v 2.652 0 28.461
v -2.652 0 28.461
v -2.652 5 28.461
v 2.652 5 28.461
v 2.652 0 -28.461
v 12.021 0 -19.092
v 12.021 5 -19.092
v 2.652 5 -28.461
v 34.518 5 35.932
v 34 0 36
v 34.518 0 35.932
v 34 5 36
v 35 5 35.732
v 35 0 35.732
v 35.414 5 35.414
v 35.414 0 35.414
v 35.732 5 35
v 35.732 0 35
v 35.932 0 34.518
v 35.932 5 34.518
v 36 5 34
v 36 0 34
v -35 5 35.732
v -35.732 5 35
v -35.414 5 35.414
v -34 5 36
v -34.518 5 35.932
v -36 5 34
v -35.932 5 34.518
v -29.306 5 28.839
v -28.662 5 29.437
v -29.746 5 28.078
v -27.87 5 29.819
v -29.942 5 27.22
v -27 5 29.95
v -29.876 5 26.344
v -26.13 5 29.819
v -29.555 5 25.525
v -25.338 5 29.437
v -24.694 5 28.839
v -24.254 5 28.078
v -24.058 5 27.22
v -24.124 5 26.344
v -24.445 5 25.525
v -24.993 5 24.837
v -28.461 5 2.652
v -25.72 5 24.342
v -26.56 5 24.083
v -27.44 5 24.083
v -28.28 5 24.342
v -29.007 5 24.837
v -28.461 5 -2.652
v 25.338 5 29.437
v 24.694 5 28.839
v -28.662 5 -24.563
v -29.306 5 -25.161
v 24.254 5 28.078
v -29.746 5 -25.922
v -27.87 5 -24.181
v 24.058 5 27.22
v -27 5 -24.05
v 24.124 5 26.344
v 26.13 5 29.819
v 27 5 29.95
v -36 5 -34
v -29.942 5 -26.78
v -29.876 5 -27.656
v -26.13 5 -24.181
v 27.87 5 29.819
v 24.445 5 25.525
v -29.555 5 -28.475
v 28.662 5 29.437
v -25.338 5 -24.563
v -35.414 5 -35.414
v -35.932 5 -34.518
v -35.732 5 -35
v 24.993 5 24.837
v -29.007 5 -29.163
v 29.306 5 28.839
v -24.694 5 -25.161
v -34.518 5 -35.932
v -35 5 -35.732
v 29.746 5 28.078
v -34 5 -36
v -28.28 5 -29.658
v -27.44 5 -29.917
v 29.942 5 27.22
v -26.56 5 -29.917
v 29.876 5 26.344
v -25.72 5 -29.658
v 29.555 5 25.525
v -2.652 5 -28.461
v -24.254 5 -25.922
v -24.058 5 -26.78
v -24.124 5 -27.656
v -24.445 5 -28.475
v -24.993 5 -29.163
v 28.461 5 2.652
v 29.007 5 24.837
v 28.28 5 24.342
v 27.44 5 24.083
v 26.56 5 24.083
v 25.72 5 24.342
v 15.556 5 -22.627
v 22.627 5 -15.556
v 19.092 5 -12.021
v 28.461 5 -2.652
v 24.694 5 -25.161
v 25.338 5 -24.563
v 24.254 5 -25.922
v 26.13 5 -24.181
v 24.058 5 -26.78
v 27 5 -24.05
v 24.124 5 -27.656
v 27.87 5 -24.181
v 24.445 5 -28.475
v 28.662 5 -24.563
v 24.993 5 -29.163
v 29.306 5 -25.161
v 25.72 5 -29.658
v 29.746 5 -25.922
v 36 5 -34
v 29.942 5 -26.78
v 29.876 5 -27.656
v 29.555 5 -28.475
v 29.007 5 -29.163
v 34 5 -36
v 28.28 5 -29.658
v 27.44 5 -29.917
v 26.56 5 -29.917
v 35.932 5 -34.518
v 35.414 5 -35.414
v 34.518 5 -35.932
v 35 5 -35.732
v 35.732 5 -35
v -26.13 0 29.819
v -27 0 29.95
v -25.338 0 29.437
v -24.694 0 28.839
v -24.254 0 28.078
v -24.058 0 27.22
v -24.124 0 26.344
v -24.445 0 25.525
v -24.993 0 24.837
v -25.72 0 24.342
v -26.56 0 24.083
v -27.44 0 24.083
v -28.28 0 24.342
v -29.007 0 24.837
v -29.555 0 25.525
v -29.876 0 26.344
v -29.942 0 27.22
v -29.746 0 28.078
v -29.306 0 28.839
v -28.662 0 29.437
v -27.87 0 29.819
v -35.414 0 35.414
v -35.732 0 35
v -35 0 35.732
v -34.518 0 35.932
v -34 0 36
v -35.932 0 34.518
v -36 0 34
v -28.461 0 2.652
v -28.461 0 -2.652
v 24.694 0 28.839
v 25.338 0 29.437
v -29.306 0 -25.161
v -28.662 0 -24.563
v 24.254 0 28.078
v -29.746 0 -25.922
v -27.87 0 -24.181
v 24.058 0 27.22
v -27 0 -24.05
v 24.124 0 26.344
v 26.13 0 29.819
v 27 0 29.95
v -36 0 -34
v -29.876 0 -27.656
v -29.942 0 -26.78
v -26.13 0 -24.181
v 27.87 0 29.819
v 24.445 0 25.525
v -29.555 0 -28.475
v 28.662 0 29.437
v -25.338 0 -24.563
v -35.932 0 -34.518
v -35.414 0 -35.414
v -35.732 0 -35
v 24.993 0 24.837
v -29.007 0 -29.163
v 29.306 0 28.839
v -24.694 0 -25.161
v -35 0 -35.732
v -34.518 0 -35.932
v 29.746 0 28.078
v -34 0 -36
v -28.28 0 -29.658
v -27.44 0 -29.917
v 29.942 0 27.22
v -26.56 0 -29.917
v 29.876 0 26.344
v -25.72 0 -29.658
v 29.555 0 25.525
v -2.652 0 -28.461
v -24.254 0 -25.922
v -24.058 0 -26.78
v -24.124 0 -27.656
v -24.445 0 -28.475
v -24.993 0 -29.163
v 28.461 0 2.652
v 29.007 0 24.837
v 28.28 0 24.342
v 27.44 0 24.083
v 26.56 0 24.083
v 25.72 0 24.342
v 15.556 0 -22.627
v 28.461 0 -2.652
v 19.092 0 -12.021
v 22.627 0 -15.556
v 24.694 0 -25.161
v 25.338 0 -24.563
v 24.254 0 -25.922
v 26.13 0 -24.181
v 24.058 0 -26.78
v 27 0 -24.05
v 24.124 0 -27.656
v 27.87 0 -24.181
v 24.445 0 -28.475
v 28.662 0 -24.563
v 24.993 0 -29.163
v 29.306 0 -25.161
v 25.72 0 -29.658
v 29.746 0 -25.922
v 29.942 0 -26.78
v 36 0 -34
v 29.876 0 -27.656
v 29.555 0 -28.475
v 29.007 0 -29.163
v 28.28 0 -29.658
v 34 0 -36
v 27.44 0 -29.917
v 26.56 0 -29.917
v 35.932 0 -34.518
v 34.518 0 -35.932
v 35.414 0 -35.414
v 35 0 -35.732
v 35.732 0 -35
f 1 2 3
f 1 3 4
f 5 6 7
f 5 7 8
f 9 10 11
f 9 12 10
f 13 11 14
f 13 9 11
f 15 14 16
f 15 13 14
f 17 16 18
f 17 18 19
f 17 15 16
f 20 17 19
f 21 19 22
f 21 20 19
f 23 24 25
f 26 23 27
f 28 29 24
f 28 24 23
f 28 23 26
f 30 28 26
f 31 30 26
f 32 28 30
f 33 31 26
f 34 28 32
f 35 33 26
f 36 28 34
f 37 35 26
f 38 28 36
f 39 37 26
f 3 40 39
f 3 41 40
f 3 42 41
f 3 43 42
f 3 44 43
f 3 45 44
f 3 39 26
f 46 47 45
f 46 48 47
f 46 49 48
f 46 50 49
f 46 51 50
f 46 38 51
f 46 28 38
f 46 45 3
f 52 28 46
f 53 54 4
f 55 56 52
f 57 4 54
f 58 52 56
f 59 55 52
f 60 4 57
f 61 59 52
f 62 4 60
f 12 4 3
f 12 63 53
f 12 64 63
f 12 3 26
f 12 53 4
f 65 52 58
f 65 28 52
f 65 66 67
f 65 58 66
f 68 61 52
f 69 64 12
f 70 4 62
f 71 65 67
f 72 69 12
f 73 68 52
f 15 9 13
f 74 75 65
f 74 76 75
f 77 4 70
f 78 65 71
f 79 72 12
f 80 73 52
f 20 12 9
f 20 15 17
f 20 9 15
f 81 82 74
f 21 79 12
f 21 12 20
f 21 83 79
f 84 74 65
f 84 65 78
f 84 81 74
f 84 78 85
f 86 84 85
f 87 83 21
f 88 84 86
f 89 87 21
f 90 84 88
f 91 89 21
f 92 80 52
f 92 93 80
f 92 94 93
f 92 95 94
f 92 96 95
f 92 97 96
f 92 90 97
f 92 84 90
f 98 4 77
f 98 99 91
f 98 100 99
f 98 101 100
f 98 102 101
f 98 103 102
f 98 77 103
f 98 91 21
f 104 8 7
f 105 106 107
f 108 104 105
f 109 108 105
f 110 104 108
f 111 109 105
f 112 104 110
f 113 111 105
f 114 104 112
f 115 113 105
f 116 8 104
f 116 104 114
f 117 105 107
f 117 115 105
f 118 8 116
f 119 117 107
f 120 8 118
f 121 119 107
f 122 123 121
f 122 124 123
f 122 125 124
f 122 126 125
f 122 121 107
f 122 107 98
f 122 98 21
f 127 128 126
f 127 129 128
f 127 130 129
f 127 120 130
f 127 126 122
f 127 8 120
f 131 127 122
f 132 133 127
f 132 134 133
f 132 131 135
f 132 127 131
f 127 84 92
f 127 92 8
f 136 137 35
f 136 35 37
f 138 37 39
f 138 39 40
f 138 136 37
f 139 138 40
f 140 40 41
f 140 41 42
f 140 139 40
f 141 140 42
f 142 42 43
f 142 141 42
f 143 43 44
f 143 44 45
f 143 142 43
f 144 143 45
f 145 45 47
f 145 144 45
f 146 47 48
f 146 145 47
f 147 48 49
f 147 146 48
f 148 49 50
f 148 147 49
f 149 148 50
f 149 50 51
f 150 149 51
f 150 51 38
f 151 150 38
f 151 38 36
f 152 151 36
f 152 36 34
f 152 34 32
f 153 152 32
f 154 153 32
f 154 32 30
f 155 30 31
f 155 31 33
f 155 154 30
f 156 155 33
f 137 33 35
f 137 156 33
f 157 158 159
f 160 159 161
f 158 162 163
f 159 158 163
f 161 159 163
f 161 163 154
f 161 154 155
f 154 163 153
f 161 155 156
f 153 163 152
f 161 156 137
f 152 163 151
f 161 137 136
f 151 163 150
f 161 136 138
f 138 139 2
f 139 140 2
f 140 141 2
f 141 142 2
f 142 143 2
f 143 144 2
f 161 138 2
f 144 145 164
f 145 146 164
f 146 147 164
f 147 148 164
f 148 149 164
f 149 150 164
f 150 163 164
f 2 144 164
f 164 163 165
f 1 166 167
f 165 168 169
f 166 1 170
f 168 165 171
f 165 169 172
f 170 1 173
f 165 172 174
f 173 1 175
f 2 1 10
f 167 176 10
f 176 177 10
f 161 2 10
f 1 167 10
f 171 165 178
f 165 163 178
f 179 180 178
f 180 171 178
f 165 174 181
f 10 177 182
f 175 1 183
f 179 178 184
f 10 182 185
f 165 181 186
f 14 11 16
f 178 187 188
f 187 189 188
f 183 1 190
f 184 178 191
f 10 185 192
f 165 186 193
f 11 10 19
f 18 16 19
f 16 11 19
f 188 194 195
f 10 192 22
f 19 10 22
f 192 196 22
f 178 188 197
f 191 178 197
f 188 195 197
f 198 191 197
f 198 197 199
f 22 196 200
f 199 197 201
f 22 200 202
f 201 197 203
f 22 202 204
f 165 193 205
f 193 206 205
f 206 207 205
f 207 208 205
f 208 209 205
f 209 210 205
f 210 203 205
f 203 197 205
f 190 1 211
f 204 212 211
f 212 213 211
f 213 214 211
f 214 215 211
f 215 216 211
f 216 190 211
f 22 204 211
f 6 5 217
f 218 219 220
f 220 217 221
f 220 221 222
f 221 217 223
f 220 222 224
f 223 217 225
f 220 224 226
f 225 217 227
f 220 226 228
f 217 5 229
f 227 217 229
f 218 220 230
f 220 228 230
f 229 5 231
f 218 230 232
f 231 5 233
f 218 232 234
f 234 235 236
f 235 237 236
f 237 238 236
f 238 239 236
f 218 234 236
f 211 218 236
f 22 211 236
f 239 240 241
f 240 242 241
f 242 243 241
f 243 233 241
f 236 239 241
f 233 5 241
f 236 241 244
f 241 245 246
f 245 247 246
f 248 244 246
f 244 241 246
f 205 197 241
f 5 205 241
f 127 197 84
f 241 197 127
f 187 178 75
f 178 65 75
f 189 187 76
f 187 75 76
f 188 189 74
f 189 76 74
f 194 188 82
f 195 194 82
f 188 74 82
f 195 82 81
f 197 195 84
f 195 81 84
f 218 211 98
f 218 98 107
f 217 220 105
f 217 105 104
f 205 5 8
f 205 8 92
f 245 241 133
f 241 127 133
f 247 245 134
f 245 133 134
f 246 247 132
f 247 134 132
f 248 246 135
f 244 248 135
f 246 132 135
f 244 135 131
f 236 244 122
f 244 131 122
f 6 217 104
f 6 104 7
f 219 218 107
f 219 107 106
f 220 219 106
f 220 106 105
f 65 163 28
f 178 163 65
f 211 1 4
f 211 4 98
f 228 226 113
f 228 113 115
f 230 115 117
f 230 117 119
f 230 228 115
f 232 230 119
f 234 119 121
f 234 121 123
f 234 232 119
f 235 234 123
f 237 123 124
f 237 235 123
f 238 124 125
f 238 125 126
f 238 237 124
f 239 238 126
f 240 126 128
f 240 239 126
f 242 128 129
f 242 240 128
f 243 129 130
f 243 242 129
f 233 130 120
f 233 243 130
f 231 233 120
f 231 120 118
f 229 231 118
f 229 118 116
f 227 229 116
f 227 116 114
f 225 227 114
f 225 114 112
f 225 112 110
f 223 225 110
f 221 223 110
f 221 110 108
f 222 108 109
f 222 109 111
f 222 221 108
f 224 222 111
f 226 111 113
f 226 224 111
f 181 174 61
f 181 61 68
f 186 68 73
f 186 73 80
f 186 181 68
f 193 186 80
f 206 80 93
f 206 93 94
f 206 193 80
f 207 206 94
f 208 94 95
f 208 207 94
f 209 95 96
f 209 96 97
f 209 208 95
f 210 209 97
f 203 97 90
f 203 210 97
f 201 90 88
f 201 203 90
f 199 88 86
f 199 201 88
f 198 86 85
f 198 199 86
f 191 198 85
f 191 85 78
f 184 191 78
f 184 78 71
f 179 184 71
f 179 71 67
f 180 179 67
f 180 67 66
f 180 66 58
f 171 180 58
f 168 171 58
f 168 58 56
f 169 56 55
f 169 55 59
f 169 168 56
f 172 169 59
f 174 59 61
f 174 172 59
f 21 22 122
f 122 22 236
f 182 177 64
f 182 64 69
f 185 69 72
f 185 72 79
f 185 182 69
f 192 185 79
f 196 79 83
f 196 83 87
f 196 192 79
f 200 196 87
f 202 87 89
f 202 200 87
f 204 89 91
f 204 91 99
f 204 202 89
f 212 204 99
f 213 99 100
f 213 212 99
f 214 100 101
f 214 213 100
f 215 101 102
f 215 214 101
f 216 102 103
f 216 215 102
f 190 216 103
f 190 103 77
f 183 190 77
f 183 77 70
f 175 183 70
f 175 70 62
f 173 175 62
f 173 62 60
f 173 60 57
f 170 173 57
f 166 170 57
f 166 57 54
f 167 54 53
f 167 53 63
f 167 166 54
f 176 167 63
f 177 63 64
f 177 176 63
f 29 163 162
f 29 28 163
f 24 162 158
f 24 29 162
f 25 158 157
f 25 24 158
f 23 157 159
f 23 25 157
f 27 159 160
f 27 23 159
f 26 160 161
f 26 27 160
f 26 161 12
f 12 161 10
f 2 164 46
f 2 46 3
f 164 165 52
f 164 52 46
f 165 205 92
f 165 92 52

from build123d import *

# Parameters (mm, degrees)
SKETCH1_W           = 72
SKETCH1_H           = 72
SKETCH1_R           = 2.95
BOSS_EXTRUDE1_DEPTH = 5
FILLET1_R           = 2


with BuildPart() as part:
    # Sketch1 → Boss-Extrude1 (new body)
    with BuildSketch(Plane(origin=(0, 0, 0), x_dir=(1, 0, 0), z_dir=(0, 1, 0))):
        Rectangle(SKETCH1_W, SKETCH1_H)
        with Locations(Location((-27, 27, 0), (0, 0, 270))):
            Circle(SKETCH1_R, mode=Mode.SUBTRACT)
        with Locations(Location((27, -27, 0), (0, 0, 270))):
            Circle(SKETCH1_R, mode=Mode.SUBTRACT)
        with Locations(Location((-27, -27, 0), (0, 0, 270))):
            Circle(SKETCH1_R, mode=Mode.SUBTRACT)
        with Locations(Location((27, 27, 0), (0, 0, 270))):
            Circle(SKETCH1_R, mode=Mode.SUBTRACT)
        Polygon((-28.461047943, -2.651650429), (-2.651650429, -28.461047943), (2.651650429, -28.461047943), (28.461047943, -2.651650429), (28.461047943, 2.651650429), (19.091883092, 12.02081528), (22.627416998, 15.556349186), (15.556349186, 22.627416998), (12.02081528, 19.091883092), (2.651650429, 28.461047943), (-2.651650429, 28.461047943), (-28.461047943, 2.651650429), align=None, mode=Mode.SUBTRACT)
    extrude(amount=BOSS_EXTRUDE1_DEPTH)

    # Fillet1
    fillet1_edges = [part.edges().sort_by_distance(p)[0] for p in [
        (36, 2.5, 36),
        (-36, 2.5, 36),
        (-36, 2.5, -36),
        (36, 2.5, -36),
    ]]
    fillet(fillet1_edges, radius=FILLET1_R)


solid = part.part
